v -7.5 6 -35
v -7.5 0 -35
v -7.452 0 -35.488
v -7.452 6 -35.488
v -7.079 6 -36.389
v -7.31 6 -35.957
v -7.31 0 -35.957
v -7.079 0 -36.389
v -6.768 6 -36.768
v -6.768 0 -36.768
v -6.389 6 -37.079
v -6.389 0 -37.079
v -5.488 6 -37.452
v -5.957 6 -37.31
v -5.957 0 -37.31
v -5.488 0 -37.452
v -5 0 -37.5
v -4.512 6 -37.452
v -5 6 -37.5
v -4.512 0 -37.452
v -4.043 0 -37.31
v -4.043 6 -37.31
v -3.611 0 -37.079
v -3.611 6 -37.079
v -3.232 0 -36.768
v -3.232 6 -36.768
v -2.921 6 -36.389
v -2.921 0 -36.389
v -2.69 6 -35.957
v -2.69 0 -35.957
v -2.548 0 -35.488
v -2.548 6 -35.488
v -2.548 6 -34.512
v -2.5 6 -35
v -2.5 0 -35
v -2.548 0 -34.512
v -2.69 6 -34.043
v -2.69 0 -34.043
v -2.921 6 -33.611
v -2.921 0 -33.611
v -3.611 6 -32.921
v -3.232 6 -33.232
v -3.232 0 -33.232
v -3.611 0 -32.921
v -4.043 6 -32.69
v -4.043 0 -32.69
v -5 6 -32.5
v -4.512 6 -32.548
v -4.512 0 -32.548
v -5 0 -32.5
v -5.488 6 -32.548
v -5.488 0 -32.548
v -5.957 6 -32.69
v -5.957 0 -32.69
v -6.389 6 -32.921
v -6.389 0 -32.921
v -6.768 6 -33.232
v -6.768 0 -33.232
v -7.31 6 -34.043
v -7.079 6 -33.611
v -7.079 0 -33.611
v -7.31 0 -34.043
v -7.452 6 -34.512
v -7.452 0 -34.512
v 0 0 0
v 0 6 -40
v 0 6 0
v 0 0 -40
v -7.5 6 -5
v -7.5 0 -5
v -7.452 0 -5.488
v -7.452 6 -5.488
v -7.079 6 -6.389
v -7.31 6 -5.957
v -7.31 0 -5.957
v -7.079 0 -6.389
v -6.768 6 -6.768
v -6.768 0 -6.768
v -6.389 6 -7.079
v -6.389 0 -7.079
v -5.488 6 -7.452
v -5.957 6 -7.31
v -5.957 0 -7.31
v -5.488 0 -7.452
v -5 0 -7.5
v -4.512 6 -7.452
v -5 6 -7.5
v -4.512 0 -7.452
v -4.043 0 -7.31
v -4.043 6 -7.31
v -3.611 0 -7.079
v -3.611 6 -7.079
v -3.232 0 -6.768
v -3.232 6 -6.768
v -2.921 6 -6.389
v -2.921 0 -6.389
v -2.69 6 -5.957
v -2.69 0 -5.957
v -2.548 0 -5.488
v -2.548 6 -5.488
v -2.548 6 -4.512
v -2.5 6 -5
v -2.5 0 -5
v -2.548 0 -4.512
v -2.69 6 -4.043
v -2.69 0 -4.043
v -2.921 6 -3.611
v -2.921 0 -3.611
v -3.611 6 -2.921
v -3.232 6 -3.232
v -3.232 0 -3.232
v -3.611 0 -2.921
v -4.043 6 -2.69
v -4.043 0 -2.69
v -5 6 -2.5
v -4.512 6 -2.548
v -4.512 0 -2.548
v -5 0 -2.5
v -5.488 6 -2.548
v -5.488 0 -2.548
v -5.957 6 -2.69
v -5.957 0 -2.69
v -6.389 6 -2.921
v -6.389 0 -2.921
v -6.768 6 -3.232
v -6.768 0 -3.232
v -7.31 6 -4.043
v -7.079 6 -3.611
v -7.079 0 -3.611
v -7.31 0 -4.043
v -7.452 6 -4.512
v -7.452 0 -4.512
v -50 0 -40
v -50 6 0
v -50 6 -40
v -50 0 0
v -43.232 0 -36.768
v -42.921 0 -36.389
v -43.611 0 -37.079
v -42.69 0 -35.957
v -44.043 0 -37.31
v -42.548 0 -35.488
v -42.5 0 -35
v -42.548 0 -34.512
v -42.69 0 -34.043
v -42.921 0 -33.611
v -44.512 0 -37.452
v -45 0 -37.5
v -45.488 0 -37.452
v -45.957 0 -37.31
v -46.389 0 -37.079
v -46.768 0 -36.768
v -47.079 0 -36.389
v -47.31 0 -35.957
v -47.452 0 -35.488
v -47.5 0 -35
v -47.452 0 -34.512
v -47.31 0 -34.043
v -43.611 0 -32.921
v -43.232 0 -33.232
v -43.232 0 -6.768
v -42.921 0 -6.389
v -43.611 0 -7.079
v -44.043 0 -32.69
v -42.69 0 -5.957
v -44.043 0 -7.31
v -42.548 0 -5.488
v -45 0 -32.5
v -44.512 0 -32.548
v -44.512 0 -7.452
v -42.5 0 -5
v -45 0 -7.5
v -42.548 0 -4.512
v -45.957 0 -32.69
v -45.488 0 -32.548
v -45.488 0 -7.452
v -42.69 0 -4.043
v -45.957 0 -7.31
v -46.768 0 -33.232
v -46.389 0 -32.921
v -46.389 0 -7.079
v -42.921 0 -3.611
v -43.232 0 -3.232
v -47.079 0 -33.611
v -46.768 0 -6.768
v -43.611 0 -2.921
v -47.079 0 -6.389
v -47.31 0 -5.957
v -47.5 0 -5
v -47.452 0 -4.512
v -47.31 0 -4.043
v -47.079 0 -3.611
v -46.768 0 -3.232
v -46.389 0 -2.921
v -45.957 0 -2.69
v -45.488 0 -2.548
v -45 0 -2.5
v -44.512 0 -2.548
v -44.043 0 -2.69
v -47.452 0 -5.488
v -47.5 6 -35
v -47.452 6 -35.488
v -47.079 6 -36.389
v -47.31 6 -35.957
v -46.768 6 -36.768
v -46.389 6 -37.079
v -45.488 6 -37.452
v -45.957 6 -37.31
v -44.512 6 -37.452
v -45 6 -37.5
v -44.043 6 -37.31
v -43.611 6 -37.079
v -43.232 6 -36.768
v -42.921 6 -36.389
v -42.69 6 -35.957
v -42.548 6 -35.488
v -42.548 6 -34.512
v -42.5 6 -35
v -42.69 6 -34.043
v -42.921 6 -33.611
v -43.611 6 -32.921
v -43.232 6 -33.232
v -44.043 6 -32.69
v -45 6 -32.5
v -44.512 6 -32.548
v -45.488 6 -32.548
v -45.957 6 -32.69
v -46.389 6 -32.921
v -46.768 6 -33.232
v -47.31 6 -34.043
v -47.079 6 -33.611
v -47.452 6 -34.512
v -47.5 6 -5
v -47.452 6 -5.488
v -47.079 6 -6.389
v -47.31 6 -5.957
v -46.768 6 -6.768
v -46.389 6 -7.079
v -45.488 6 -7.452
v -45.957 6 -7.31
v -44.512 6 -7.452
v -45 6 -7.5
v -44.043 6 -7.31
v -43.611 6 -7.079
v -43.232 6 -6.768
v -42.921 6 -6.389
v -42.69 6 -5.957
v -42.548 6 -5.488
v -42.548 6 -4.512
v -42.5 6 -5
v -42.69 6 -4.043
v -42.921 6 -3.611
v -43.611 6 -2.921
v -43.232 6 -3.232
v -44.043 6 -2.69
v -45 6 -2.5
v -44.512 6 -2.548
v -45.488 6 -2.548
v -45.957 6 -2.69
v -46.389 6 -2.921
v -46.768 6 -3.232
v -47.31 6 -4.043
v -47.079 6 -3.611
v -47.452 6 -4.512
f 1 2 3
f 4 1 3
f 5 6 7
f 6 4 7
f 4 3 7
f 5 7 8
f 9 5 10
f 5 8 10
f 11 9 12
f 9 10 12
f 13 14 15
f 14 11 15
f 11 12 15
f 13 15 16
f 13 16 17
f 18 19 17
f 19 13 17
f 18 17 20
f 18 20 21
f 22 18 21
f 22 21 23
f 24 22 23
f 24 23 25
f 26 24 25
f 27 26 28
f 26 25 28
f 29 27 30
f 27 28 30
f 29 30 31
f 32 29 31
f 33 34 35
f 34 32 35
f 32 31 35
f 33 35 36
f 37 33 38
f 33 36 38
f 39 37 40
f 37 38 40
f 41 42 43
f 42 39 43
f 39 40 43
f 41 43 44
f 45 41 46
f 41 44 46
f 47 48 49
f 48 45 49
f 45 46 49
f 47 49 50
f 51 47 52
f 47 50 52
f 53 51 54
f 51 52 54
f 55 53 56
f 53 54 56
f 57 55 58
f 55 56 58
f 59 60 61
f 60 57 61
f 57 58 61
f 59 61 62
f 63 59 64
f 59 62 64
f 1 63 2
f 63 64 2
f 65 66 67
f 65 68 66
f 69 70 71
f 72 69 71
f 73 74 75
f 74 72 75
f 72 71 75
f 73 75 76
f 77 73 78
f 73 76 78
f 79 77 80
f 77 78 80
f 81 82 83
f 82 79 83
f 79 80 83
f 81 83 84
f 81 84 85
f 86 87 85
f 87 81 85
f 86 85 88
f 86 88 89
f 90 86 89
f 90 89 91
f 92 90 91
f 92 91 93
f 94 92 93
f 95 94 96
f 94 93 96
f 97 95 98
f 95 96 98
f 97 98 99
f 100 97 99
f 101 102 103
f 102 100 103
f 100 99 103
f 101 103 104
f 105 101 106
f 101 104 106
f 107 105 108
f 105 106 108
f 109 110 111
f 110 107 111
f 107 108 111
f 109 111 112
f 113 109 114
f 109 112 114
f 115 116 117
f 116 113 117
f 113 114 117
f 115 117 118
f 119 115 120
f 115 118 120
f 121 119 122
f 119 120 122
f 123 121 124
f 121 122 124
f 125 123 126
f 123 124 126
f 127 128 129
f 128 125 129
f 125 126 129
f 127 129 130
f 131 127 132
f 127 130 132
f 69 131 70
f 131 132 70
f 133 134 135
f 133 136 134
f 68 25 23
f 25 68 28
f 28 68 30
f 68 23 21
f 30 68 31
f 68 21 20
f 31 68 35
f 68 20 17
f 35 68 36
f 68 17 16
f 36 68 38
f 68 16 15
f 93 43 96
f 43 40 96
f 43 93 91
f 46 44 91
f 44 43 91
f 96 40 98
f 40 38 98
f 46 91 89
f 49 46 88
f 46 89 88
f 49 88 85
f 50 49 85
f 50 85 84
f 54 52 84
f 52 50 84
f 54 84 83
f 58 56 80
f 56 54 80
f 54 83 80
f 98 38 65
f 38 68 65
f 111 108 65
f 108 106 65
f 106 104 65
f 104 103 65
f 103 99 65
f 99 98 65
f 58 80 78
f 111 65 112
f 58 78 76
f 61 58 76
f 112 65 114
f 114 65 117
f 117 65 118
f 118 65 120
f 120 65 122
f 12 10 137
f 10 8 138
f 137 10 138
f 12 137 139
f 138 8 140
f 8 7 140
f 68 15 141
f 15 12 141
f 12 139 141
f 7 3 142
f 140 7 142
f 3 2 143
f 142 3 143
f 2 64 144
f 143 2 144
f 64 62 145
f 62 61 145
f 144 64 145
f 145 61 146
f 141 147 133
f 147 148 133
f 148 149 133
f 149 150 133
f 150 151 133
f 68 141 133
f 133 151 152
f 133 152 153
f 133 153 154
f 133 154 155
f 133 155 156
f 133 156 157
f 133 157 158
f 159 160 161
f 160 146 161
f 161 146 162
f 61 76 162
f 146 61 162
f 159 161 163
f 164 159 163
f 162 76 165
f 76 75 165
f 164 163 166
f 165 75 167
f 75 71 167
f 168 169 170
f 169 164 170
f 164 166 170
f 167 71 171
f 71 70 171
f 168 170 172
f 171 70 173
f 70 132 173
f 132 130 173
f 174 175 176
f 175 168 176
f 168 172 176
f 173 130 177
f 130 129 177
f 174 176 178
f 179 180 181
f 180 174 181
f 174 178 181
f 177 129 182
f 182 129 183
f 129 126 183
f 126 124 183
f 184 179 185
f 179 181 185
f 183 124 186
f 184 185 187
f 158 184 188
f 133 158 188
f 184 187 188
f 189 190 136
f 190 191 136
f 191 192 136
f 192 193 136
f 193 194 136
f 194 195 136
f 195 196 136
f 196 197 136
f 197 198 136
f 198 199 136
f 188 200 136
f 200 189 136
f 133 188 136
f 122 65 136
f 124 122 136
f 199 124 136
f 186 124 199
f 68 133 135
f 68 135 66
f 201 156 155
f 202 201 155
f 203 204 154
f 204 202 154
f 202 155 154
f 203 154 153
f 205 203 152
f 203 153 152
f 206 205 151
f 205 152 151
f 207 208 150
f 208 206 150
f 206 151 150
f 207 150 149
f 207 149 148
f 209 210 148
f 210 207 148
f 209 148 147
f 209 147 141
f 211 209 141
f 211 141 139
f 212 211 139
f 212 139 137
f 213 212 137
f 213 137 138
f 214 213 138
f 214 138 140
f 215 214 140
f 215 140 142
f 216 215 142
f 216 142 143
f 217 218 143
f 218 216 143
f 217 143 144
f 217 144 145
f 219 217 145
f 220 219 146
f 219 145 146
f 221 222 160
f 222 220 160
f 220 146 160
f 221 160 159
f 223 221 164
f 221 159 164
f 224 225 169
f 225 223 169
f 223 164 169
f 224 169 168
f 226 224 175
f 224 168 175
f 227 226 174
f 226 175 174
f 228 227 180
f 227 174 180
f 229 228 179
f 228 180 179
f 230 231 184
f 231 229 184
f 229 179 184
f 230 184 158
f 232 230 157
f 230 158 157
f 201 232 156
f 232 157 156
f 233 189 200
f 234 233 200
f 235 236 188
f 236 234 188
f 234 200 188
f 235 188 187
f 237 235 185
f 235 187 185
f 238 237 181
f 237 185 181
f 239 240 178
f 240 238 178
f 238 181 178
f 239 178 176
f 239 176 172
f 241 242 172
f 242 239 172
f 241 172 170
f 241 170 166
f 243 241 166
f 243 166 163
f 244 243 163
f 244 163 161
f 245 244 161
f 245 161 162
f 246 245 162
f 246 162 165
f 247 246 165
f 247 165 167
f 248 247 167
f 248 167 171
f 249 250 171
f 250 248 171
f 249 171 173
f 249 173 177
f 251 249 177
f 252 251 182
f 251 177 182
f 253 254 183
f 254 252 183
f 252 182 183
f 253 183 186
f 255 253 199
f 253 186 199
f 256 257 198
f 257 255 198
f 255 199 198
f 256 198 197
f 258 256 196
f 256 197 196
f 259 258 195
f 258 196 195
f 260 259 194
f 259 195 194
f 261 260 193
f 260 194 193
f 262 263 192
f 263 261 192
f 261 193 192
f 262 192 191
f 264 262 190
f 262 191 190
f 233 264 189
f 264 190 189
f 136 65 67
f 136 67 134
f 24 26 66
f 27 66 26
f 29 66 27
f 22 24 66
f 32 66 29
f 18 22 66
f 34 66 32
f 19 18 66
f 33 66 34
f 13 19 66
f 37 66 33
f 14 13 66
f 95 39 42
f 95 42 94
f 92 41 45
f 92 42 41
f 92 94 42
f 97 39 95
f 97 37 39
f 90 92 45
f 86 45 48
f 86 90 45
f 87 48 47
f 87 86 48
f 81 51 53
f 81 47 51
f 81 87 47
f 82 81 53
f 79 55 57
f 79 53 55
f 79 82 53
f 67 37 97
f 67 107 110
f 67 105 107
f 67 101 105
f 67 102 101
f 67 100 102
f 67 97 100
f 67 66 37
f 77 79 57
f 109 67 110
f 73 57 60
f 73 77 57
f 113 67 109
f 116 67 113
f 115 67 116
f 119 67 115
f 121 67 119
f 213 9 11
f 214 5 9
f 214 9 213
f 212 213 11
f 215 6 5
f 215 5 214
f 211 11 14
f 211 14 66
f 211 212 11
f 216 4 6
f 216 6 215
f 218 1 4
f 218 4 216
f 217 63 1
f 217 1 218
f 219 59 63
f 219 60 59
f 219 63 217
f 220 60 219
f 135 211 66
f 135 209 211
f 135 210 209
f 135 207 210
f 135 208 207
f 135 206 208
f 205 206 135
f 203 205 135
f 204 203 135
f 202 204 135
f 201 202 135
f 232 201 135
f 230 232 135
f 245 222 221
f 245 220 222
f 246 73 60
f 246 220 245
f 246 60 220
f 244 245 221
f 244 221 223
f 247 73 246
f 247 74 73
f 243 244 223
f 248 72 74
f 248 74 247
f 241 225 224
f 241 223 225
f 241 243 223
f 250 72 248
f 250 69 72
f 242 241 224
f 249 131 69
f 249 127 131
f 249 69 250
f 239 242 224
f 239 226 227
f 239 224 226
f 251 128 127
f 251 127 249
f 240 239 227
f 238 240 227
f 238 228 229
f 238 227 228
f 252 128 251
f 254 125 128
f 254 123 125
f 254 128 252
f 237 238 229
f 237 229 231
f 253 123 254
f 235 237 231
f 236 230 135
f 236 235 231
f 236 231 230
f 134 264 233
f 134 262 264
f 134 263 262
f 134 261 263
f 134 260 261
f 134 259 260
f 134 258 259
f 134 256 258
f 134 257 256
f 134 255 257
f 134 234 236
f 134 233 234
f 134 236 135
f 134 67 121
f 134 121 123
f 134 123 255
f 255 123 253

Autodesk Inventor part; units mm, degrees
ref_plane "YZ Plane" through (0, 0, 0) normal (1, 0, 0) x (0, 1, 0)
ref_plane "XZ Plane" through (0, 0, 0) normal (0, 1, 0) x (-1, 0, 0)
ref_plane "XY Plane" through (0, 0, 0) normal (0, 0, 1) x (1, 0, 0)
sketch "Esquisse1" plane through (0, 0, 0) normal (0, 1, 0) x (-1, 0, 0)
  line L0 (0, 0) -> (50, 0)
  line L1 (50, 0) -> (50, -40)
  line L2 (50, -40) -> (0, -40)
  line L3 (0, -40) -> (0, 0)
  line L4 (50, -20) -> (0, -20) construction
  line L5 (50, -10) -> (0, -10) construction
  line L6 (50, -30) -> (0, -30) construction
  circle A0 centre (45, -5) radius 2.5
  line L7 (25, 0) -> (25, -40) construction
  circle A1 centre (5, -5) radius 2.5
  circle A2 centre (45, -35) radius 2.5
  circle A3 centre (5, -35) radius 2.5
  dimension "d0" = 50
  dimension "d2" = 10
  dimension "d3" = 10
  dimension "d4" = 5
  dimension "d12" = 5
  dimension "d13" = 20
  dimension "d14" = 20
extrude "Extrusion1" add sketch "Esquisse1" along normal blind 6
equation "\"d3\" = d2"
properties part number "hold_motor_bottom" material "Bois (cerisier)"
